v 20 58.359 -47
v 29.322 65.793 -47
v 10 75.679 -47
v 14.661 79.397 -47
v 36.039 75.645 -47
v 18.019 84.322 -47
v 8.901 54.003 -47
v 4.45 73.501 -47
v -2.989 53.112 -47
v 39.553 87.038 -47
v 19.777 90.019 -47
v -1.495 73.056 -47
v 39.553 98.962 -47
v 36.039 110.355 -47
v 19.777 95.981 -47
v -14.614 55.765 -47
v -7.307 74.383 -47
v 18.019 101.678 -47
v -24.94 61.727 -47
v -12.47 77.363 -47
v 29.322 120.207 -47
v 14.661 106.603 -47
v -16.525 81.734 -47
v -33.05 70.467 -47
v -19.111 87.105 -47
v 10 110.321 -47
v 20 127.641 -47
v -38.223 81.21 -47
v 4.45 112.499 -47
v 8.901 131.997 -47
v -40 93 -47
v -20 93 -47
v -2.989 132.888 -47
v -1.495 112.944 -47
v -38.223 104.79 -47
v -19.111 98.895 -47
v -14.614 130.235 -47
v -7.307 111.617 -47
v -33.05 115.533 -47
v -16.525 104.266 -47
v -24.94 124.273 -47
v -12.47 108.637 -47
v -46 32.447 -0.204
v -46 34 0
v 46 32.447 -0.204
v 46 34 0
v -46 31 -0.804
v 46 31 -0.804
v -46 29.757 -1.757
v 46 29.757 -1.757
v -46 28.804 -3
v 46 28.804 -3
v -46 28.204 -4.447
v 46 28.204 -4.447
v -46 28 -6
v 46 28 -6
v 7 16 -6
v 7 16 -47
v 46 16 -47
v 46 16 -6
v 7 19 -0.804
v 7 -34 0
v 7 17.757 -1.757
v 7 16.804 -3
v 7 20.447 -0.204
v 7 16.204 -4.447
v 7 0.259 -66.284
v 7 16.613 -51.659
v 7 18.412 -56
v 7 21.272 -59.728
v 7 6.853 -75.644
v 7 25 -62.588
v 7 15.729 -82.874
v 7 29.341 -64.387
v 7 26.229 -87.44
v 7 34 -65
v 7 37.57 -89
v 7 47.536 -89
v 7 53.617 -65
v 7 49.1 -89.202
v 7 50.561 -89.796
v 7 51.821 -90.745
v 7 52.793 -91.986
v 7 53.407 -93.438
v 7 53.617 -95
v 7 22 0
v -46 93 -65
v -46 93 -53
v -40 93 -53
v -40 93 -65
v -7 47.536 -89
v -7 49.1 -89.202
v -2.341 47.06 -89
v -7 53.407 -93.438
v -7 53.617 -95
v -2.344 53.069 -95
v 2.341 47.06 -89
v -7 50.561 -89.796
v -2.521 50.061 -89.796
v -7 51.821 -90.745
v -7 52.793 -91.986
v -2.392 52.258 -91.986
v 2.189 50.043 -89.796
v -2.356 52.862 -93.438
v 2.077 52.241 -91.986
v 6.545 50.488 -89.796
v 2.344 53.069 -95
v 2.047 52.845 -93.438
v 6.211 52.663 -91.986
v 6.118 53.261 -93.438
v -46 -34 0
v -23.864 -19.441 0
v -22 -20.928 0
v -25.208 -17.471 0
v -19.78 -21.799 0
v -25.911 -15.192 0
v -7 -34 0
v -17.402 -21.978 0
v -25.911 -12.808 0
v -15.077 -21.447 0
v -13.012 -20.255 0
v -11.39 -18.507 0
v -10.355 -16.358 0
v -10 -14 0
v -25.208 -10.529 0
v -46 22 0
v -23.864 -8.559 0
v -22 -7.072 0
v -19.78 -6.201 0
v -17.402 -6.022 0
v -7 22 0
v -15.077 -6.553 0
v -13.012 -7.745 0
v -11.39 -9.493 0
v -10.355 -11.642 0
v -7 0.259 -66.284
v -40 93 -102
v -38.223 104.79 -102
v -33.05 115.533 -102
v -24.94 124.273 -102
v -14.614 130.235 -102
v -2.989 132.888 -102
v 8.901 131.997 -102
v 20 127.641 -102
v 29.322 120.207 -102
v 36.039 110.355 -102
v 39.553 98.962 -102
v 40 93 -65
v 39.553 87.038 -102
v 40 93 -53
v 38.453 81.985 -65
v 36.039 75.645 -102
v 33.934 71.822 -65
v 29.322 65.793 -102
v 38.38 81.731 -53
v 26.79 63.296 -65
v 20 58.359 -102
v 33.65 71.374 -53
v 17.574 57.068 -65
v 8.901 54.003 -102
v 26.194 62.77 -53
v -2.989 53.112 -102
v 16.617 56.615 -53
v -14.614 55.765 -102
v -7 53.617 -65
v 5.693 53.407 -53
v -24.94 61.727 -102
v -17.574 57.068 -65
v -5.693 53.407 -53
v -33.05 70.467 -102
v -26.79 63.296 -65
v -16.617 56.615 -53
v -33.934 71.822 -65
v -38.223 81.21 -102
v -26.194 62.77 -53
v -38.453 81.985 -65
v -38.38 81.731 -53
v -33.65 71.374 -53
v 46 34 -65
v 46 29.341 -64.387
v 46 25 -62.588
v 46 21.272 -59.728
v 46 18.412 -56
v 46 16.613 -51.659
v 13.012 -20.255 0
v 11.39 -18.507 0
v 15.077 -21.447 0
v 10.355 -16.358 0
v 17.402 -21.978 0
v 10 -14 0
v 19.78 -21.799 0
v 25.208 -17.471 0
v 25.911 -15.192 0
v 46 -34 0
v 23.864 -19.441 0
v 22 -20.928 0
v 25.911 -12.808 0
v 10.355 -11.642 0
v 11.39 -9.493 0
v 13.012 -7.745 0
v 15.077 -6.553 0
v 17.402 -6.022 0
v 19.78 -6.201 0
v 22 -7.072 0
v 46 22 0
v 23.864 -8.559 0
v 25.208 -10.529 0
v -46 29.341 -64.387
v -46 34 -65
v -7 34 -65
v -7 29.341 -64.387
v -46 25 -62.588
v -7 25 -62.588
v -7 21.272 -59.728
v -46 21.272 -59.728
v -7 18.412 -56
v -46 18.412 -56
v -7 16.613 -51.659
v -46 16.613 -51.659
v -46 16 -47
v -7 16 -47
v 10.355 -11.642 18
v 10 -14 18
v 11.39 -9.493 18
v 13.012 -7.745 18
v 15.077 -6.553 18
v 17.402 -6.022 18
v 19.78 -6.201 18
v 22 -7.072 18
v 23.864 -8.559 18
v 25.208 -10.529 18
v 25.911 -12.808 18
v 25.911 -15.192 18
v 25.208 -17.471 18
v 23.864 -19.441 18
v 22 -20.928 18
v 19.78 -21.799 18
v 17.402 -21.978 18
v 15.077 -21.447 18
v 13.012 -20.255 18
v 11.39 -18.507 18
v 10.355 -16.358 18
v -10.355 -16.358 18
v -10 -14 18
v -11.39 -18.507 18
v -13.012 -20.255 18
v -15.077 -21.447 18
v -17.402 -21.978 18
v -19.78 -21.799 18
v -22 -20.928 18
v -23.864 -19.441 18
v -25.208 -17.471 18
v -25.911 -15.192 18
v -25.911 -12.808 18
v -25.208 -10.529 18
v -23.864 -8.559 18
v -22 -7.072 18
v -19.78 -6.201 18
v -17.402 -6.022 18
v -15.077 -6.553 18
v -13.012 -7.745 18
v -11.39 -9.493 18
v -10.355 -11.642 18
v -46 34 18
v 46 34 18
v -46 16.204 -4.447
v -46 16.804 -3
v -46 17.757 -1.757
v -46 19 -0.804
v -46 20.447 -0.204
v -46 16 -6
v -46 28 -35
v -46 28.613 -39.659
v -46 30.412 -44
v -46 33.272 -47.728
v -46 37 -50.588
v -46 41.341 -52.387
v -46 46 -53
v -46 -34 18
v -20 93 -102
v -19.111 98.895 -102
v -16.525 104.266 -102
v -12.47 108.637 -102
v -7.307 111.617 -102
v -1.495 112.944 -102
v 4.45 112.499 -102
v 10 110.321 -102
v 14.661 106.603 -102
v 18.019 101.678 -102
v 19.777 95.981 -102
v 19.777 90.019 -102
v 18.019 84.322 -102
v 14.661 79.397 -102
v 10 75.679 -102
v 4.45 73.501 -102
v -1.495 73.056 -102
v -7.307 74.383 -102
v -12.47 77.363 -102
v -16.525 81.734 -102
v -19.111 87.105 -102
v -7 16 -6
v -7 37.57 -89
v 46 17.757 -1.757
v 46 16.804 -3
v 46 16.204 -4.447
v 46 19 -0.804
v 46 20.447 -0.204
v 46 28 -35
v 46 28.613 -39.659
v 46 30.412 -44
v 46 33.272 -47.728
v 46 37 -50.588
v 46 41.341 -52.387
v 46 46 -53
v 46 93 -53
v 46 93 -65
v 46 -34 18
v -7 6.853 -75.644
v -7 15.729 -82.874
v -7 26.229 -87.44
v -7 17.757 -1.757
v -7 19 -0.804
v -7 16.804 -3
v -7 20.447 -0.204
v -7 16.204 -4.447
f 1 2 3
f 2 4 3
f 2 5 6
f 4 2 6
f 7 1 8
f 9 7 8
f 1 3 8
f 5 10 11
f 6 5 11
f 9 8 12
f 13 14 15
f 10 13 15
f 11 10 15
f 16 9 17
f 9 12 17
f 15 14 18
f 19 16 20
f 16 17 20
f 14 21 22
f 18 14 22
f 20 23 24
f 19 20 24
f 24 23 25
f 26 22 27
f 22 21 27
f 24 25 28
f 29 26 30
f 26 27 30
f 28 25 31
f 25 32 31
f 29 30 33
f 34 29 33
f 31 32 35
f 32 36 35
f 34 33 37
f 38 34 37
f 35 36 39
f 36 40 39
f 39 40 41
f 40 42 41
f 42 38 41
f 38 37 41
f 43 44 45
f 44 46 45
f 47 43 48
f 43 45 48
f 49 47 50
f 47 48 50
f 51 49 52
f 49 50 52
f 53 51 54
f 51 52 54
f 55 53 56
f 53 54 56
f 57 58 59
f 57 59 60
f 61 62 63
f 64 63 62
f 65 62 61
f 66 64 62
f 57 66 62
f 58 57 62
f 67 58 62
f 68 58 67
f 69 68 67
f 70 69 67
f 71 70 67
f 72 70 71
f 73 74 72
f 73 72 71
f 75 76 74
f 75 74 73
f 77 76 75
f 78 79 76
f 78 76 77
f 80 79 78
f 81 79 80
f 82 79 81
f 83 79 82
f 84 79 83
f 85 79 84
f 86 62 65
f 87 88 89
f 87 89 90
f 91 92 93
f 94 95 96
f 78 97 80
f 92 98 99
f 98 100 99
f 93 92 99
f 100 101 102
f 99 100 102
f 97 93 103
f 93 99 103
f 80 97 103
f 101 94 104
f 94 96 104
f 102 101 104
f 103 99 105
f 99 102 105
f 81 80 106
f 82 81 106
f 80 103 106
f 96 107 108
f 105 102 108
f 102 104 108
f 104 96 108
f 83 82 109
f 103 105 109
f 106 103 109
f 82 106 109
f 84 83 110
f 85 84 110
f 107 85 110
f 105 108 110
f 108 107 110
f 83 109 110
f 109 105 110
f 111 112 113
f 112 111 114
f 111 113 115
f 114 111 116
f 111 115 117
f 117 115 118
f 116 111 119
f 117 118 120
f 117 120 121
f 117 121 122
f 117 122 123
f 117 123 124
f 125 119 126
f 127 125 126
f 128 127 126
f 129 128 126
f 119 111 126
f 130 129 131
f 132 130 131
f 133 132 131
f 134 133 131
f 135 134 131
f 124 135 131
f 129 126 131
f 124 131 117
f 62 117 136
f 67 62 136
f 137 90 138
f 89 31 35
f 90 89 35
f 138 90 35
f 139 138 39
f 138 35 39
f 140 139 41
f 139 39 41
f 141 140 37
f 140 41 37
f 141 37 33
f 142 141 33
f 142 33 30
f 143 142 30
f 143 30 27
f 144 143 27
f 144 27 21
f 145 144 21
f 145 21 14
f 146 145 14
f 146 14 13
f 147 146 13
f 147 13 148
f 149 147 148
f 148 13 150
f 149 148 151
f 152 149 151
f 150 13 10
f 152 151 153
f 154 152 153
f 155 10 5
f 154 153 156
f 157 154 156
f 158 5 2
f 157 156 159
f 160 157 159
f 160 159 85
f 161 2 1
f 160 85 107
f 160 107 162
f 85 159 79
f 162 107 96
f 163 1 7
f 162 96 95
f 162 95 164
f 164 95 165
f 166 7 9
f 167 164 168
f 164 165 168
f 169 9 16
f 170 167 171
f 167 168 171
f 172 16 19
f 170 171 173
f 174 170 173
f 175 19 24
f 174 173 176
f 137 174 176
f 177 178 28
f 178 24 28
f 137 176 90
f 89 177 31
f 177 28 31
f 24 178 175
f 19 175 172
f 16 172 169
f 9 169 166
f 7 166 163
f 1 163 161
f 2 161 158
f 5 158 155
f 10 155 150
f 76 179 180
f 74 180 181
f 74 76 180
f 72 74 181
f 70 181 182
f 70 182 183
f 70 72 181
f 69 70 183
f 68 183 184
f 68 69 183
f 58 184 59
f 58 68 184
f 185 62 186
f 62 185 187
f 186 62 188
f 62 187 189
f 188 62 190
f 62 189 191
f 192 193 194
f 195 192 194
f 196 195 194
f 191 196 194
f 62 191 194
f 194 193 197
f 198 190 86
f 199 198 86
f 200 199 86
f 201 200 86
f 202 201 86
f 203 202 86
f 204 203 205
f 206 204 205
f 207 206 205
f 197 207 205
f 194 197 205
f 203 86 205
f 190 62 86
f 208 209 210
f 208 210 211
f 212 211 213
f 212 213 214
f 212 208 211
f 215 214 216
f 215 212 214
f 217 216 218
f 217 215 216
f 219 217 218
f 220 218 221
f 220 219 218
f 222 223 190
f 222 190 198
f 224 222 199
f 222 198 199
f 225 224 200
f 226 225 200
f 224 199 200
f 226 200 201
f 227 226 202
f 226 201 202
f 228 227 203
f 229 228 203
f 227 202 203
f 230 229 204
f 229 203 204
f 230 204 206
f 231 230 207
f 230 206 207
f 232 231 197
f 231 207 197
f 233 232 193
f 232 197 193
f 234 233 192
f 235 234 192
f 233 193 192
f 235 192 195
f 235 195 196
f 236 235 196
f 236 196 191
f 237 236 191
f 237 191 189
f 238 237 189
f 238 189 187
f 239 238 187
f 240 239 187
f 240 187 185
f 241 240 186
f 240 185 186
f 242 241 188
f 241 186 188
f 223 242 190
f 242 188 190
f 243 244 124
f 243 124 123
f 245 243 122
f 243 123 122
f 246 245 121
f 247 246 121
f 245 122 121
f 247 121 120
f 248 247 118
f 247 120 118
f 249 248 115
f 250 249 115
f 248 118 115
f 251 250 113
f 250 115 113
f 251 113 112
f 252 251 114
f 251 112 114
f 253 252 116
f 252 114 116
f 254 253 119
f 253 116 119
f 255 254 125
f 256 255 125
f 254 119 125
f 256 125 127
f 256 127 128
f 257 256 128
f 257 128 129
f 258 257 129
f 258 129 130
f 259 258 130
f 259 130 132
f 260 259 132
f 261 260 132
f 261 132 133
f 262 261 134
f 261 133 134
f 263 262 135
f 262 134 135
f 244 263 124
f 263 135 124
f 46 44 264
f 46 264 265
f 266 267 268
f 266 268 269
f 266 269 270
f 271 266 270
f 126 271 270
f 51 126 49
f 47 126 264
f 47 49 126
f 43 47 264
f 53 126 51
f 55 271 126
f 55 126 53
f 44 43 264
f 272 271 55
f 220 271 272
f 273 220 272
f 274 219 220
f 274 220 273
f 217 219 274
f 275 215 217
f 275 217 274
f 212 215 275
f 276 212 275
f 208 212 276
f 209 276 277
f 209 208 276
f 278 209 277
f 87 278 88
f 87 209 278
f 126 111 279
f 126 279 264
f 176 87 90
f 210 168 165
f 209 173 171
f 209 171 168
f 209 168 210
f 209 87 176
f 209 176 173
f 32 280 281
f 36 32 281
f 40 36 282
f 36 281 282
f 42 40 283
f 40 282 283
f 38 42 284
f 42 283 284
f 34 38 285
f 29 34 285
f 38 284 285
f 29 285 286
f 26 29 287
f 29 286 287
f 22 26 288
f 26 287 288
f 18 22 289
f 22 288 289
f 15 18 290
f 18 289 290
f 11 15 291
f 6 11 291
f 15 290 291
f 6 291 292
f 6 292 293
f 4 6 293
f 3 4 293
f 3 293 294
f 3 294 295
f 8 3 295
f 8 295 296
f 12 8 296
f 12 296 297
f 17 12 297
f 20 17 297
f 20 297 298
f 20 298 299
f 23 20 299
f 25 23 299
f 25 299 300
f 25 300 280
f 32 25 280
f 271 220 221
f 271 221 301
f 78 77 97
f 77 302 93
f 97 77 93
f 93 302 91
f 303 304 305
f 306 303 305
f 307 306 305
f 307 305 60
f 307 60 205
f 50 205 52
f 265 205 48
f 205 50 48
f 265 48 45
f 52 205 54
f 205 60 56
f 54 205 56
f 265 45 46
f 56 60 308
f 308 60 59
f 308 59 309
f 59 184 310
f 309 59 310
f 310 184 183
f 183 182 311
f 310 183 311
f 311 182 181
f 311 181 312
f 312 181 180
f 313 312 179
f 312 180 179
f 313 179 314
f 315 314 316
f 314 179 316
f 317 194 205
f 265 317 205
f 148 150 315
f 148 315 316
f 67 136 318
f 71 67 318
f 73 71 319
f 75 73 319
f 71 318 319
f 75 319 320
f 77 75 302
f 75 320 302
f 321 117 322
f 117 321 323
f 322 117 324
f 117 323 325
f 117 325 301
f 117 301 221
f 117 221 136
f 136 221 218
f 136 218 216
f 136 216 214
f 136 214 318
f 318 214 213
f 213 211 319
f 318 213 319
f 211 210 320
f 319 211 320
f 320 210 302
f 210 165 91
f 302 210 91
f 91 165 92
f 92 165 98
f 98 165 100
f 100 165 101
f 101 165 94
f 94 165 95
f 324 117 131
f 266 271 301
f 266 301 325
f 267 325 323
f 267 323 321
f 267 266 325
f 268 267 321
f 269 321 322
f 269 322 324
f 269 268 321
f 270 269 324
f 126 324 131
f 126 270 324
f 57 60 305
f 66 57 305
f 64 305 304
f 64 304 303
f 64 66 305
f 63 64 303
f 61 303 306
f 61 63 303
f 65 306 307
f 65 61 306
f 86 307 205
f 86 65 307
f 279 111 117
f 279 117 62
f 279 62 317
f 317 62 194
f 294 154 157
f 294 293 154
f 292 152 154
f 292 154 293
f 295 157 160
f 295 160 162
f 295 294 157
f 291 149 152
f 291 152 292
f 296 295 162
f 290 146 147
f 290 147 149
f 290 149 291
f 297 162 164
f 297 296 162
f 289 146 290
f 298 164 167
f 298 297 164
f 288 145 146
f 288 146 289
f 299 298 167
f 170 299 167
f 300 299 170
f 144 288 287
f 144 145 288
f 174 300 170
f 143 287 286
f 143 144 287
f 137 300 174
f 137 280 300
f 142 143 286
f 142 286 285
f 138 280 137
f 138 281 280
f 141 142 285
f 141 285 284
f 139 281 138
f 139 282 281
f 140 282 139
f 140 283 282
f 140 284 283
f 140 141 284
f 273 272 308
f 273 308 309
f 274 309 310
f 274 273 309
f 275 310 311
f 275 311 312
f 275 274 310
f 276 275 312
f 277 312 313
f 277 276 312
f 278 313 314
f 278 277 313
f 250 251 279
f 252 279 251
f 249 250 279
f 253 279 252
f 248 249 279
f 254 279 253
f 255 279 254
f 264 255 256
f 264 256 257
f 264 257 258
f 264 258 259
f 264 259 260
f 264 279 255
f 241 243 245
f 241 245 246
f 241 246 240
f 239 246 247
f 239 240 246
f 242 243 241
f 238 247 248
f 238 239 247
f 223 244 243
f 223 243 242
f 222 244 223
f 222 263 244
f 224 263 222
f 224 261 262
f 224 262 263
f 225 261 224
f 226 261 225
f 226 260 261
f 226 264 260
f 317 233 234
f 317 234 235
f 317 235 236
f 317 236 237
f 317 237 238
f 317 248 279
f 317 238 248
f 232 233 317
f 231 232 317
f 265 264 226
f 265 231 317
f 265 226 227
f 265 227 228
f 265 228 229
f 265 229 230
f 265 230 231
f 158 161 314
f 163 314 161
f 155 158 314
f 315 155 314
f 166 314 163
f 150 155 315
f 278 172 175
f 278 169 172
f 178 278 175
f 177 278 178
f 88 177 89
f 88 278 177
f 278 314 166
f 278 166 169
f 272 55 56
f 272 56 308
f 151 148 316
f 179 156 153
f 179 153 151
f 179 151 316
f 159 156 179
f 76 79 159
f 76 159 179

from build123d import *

# Parameters (mm, degrees)
SKETCH1_W                = 92
SKETCH1_H                = 68
BOSS_EXTRUDE1_DEPTH      = 18
SKETCH2_R                = 8
CUT_EXTRUDE4_DEPTH       = 18
BOSS_EXTRUDE3_DEPTH      = 92
FILLET2_R                = 6
BOSS_EXTRUDE4_DEPTH      = 37
BOSS_EXTRUDE4_DEPTH_BACK = 18
SKETCH9_R                = 40
SKETCH10_R               = 20
CUT_EXTRUDE6_DEPTH       = 90
RIB6_START               = -7
RIB6_DEPTH               = 14
FILLET3_R                = 6


# Read off the part's stored shape, not the designer's step: Rib6
with BuildPart() as part:
    # Sketch1 → Boss-Extrude1 (new body)
    with BuildSketch(Plane.XY):
        Rectangle(SKETCH1_W, SKETCH1_H)
    extrude(amount=BOSS_EXTRUDE1_DEPTH)

    # Sketch2 → Cut-Extrude4 (cut)
    with BuildSketch(Plane(origin=(0, 0, 0), x_dir=(-1, 0, 0), z_dir=(0, 0, -1))):
        with Locations((-18, -14)):
            Circle(SKETCH2_R)
        with Locations(Location((18, -14, 0), (0, 0, 180))):
            Circle(SKETCH2_R)
    extrude(amount=-CUT_EXTRUDE4_DEPTH, mode=Mode.SUBTRACT)

    # Sketch7 → Boss-Extrude3 (add)
    with BuildSketch(Plane.ZY.offset(46)):
        with BuildLine():
            Line((0, 28), (-35, 28))
            ThreePointArc((-35, 28), (-47.727922061, 33.272077939), (-53, 46))
            Line((-53, 46), (-53, 93))
            Line((-53, 93), (-65, 93))
            Line((-65, 93), (-65, 34))
            ThreePointArc((-65, 34), (-59.727922061, 21.272077939), (-47, 16))
            Line((-47, 16), (-6, 16))
            ThreePointArc((-6, 16), (-1.757359313, 17.757359313), (0, 22))
            Line((0, 22), (0, 28))
        make_face()
    extrude(amount=-BOSS_EXTRUDE3_DEPTH)

    # Fillet2
    fillet2_edges = [part.edges().sort_by_distance(p)[0] for p in [
        (0, 28, 0),
    ]]
    fillet(fillet2_edges, radius=FILLET2_R - 0.0001)  # a hair under: the kernel refuses the full size

    # Sketch9 → Boss-Extrude4 (add, two sides: drawn at the far end of the back side and taken through both)
    with BuildSketch(Plane(origin=(0, 0, -65), x_dir=(-1, 0, 0), z_dir=(0, 0, -1)).offset(-BOSS_EXTRUDE4_DEPTH_BACK)):
        with Locations((0, 93)):
            Circle(SKETCH9_R)
    extrude(amount=BOSS_EXTRUDE4_DEPTH + BOSS_EXTRUDE4_DEPTH_BACK)

    # Sketch10 → Cut-Extrude6 (cut)
    with BuildSketch(Plane(origin=(0, 0, -102), x_dir=(-1, 0, 0), z_dir=(0, 0, -1))):
        with Locations((0, 93)):
            Circle(SKETCH10_R)
    extrude(amount=-CUT_EXTRUDE6_DEPTH, mode=Mode.SUBTRACT)

    # Rib6 outline → Rib6 (add)
    with BuildSketch(Plane(origin=(0, 0, 0), x_dir=(0, 0, -1), z_dir=(1, 0, 0)).offset(RIB6_START)):
        with BuildLine():
            Line((89, 54), (65, 54))
            Line((65, 54), (65, 34))
            ThreePointArc((65, 34), (59.727922061, 21.272077939), (47, 16))
            Line((47, 16), (6, 16))
            ThreePointArc((6, 16), (1.757359313, 17.757359313), (0, 22))
            Line((0, 22), (0, -34))
            Line((0, -34), (66.284356879, 0.259330522))
            ThreePointArc((66.284356879, 0.259330522), (82.874384935, 15.729386584), (89, 37.570368832))
            Line((89, 37.570368832), (89, 54))
        make_face()
    extrude(amount=RIB6_DEPTH)

    # Fillet3
    fillet3_edges = [part.edges().sort_by_distance(p)[0] for p in [
        (0, 53, -89),
    ]]
    fillet(fillet3_edges, radius=FILLET3_R)


solid = part.part
